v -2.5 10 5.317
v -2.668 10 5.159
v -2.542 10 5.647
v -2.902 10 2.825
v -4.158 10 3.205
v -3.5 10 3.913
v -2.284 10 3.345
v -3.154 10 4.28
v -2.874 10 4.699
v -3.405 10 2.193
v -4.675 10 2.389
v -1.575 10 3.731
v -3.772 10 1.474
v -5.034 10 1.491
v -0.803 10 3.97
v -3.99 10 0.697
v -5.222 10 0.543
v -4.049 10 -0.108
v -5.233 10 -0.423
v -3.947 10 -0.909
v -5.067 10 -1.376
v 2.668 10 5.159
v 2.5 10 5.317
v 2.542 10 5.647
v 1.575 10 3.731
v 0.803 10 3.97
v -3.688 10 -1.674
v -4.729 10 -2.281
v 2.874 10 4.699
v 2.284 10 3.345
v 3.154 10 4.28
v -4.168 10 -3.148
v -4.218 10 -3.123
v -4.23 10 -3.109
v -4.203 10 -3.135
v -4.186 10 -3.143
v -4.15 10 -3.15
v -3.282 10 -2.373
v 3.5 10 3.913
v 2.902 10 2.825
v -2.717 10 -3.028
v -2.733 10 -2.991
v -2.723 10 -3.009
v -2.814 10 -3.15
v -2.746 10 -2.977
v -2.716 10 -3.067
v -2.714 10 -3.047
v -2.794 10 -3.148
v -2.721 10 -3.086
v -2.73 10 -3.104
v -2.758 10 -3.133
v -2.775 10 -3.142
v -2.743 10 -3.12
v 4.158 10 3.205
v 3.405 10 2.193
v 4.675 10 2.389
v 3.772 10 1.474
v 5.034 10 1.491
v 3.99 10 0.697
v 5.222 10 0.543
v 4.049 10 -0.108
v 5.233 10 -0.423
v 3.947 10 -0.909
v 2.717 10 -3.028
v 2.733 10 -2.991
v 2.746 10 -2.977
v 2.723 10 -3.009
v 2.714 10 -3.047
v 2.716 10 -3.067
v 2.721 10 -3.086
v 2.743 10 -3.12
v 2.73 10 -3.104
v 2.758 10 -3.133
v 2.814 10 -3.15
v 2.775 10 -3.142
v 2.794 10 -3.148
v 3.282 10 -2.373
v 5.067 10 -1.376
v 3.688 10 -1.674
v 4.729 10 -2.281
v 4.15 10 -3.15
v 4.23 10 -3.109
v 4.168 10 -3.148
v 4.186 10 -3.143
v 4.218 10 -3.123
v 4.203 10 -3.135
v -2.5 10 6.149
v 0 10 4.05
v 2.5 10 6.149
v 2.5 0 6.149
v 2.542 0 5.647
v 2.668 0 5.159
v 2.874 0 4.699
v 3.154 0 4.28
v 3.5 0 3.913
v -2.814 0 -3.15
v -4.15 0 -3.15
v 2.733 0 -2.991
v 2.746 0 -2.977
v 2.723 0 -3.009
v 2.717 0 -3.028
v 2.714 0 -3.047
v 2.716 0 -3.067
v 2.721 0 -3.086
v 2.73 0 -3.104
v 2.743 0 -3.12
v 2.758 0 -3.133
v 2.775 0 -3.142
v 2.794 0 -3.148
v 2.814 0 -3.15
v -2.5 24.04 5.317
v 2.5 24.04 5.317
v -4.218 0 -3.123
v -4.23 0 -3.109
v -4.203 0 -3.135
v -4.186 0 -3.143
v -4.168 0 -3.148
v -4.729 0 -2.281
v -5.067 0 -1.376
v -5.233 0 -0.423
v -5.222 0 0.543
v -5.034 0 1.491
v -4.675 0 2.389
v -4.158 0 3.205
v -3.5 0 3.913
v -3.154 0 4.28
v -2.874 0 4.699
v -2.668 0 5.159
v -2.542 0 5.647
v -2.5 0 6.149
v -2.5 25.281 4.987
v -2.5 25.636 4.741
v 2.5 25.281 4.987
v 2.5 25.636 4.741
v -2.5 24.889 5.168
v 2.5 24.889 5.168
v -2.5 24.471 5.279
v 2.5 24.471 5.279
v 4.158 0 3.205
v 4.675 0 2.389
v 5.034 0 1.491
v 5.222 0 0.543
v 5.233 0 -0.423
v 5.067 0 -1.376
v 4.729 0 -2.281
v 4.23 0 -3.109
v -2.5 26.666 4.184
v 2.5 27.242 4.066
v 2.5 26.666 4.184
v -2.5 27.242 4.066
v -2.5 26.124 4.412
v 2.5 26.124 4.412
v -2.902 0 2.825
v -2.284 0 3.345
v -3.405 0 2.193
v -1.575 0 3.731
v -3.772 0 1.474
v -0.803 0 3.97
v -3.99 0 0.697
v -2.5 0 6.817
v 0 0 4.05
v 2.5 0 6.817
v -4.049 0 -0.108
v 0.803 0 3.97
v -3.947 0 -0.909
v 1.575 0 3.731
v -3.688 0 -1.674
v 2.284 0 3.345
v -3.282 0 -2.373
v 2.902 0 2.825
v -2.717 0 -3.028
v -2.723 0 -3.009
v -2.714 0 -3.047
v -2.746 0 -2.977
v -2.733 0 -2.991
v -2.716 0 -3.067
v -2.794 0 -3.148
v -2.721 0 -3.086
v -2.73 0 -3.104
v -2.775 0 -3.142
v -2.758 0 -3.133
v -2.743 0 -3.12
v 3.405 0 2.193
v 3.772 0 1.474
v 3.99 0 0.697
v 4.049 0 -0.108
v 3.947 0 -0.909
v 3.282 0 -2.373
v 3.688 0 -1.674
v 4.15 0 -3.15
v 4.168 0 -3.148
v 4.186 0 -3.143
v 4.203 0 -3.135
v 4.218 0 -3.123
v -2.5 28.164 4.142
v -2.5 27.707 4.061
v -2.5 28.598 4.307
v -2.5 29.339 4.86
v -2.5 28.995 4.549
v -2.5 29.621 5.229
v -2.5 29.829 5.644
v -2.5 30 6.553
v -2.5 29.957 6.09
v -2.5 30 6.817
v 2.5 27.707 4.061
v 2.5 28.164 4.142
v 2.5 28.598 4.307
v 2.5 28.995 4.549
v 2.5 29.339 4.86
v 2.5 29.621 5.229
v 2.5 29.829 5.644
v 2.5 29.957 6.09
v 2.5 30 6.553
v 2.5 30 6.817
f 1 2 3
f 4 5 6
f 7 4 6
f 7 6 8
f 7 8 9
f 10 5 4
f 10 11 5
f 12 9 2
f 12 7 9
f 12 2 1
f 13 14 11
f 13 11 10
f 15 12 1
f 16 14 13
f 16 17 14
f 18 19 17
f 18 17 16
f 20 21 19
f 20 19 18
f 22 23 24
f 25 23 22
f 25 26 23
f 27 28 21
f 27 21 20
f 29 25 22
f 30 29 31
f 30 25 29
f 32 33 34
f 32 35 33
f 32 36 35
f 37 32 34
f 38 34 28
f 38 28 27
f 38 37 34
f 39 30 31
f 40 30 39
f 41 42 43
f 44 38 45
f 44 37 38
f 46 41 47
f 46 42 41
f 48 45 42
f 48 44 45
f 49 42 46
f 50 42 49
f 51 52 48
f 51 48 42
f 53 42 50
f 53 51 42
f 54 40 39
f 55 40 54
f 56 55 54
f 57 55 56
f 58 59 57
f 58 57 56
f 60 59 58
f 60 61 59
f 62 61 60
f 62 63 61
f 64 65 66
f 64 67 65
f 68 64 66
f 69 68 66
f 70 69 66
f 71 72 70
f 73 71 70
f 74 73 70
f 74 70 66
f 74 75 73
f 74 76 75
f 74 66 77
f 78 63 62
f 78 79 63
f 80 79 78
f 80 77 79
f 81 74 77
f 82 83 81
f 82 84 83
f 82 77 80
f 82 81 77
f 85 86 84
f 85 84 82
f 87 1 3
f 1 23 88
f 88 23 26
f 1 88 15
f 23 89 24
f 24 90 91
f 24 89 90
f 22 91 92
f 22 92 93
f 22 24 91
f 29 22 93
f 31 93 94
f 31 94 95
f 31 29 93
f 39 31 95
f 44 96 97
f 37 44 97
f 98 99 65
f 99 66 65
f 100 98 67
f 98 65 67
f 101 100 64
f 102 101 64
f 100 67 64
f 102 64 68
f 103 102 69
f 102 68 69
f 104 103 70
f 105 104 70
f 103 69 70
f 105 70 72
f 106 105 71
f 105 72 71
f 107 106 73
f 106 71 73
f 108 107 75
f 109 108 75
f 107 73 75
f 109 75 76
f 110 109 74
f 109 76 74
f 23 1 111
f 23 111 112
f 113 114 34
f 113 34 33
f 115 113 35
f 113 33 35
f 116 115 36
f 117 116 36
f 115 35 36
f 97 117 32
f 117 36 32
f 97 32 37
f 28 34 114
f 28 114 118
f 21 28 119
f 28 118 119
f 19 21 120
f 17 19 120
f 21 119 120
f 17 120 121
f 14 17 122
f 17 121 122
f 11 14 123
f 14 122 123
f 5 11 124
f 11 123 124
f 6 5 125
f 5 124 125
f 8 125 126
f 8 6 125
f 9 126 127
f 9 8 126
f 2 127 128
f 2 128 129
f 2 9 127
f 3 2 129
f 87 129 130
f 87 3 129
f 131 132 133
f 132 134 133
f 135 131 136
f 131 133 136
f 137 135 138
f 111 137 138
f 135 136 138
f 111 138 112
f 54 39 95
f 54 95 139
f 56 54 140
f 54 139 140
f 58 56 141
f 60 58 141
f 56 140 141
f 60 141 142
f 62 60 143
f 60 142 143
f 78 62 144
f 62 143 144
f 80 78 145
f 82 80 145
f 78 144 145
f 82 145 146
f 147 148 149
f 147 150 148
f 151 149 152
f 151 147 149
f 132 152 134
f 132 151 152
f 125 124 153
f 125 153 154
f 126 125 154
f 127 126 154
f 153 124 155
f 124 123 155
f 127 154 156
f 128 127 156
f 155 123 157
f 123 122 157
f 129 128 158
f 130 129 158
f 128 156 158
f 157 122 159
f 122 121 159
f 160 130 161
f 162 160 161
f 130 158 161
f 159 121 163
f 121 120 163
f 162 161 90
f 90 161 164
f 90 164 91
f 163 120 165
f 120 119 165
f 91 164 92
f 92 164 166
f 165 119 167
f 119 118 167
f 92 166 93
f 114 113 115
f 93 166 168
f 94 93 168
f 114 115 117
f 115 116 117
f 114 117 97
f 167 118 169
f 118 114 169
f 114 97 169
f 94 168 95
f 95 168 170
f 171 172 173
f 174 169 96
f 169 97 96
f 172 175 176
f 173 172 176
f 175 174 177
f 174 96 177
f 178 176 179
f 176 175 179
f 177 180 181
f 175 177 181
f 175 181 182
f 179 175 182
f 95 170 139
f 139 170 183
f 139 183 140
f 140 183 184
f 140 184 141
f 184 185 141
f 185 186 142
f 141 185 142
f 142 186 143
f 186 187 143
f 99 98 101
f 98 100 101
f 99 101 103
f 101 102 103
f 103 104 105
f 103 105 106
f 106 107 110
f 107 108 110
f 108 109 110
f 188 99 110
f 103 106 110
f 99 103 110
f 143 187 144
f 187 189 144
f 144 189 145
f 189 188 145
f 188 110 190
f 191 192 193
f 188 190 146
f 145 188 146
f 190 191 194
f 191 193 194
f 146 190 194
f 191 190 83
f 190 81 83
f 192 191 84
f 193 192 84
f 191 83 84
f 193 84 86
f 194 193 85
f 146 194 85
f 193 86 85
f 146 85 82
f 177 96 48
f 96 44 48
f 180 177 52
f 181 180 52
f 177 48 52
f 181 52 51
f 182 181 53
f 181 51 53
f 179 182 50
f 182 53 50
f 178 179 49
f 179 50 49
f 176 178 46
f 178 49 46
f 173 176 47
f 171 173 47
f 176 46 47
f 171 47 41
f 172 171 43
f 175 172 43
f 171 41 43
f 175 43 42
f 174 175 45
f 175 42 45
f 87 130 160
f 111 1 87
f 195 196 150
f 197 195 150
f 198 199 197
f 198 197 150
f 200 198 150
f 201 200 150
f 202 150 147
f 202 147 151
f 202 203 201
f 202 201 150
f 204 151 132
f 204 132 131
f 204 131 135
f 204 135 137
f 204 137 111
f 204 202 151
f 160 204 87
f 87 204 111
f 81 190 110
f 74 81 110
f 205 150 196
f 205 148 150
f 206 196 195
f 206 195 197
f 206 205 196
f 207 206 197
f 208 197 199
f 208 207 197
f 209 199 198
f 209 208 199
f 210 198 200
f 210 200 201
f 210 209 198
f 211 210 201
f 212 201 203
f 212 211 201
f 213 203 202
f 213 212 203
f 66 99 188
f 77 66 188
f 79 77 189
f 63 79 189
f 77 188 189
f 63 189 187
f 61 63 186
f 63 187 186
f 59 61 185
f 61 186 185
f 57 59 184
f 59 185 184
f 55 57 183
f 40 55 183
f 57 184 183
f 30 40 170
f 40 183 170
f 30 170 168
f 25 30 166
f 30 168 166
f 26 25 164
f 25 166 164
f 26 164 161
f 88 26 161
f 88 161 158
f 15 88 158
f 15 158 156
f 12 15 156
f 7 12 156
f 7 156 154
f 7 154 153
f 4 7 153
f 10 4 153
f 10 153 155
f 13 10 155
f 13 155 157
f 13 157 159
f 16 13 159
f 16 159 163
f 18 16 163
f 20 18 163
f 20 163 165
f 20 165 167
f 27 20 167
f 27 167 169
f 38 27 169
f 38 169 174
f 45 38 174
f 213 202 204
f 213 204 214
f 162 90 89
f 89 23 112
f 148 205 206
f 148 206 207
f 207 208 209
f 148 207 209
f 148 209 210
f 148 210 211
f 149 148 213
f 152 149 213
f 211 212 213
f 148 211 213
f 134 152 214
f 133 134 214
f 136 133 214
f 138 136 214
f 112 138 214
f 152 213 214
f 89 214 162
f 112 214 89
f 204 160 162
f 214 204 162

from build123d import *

# Parameters (mm, degrees)
BOSS_EXTRUDE1_DEPTH = 10
FILLET3_R           = 3
SKETCH1_3_W         = 5
SKETCH1_3_H         = 1.5
BOSS_EXTRUDE2_DEPTH = 30
BOSS_EXTRUDE3_DEPTH = 2.5
FILLET1_R           = 2.5
FILLET4_R           = 0.1


with BuildPart() as part:
    # Sketch1 → Boss-Extrude1 (new body)
    with BuildSketch(Plane(origin=(0, 0, 0), x_dir=(1, 0, 0), z_dir=(0, 1, 0))):
        with BuildLine():
            ThreePointArc((2.545584412, 3.15), (0, -4.05), (-2.545584412, 3.15))
            Line((-2.545584412, 3.15), (-4.2, 3.15))
            ThreePointArc((-4.2, 3.15), (-5.128577821, -1.122581638), (-2.5, -4.616546328))
            Line((-2.5, -4.616546328), (-2.5, -6.816546328))
            Line((-2.5, -6.816546328), (2.5, -6.816546328))
            Line((2.5, -6.816546328), (2.5, -4.616546328))
            ThreePointArc((2.5, -4.616546328), (5.128577821, -1.122581638), (4.2, 3.15))
            Line((4.2, 3.15), (2.545584412, 3.15))
        make_face()
    extrude(amount=BOSS_EXTRUDE1_DEPTH)

    # Fillet3
    fillet3_edges = [part.edges().sort_by_distance(p)[0] for p in [
        (-2.5, 5, 4.616546328),
        (2.5, 5, 4.616546328),
    ]]
    fillet(fillet3_edges, radius=FILLET3_R)

    # Sketch1<3> → Boss-Extrude2 (add)
    with BuildSketch(Plane(origin=(0, 0, 0), x_dir=(1, 0, 0), z_dir=(0, 1, 0))):
        with Locations((0, -6.066546328)):
            Rectangle(SKETCH1_3_W, SKETCH1_3_H)
    extrude(amount=BOSS_EXTRUDE2_DEPTH)

    # Sketch2 → Boss-Extrude3 (add, symmetric)
    with BuildSketch(Plane.ZY):
        with BuildLine():
            Line((5.316546328, 25.10300567), (5.316546328, 30))
            ThreePointArc((5.316546328, 30), (4.05, 27.551502835), (5.316546328, 25.10300567))
        make_face()
    extrude(amount=BOSS_EXTRUDE3_DEPTH, both=True)

    # Fillet1
    fillet1_edges = [part.edges().sort_by_distance(p)[0] for p in [
        (0, 30, 5.316546328),
        (0, 25.10300567, 5.316546328),
    ]]
    fillet(fillet1_edges, radius=FILLET1_R)

    # Fillet4
    fillet4_edges = [part.edges().sort_by_distance(p)[0] for p in [
        (-4.2, 5, -3.15),
        (-2.545584412, 5, -3.15),
        (2.545584412, 5, -3.15),
        (4.2, 5, -3.15),
    ]]
    fillet(fillet4_edges, radius=FILLET4_R)


solid = part.part
